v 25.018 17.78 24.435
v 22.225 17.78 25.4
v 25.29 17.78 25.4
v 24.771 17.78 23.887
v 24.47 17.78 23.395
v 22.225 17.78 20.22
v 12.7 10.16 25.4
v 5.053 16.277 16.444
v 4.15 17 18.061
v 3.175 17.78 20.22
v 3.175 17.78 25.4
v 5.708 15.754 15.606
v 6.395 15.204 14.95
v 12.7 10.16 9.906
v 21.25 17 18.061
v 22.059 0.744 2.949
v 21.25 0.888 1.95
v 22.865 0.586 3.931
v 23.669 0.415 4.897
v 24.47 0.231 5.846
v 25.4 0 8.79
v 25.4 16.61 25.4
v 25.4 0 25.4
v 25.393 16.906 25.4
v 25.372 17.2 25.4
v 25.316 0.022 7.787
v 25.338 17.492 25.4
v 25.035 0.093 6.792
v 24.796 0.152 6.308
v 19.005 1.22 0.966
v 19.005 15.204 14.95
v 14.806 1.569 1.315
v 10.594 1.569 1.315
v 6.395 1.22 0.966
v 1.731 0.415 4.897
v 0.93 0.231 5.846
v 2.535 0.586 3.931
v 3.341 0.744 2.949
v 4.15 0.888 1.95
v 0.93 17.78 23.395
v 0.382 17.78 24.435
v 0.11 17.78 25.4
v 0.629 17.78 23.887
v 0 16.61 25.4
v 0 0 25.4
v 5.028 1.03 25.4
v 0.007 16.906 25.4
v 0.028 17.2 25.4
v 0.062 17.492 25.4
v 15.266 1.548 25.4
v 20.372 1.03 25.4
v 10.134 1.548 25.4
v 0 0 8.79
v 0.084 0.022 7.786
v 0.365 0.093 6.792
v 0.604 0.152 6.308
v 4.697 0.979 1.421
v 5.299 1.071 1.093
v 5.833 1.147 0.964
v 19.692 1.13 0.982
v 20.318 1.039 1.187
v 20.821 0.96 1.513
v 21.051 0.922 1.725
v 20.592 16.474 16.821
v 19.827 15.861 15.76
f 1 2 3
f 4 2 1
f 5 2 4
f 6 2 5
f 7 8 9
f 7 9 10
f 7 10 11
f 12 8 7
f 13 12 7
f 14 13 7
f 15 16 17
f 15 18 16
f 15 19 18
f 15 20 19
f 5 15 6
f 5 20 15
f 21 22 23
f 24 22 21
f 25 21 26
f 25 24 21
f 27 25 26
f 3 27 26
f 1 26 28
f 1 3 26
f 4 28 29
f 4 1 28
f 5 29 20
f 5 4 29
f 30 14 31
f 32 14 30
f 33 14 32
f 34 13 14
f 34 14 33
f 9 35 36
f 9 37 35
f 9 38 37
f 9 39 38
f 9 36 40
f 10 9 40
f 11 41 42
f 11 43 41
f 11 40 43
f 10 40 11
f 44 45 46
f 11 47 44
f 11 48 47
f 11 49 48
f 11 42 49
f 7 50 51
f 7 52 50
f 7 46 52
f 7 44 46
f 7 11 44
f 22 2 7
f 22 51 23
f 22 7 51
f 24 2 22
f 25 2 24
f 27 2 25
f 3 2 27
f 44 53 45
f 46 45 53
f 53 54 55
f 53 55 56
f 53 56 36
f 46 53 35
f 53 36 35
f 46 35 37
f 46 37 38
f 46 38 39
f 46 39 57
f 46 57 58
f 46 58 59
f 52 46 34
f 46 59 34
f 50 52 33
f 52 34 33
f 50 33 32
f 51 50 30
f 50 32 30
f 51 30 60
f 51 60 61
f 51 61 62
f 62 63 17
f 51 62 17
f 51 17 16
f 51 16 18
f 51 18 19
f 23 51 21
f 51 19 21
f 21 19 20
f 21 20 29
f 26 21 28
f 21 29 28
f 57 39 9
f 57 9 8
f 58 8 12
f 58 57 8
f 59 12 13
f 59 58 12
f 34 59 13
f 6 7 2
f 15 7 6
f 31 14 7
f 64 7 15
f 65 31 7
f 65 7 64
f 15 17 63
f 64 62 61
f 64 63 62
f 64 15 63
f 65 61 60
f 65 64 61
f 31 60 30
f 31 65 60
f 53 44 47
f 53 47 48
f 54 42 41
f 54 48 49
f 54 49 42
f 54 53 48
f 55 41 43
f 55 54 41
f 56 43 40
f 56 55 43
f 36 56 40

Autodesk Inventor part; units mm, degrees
ref_plane "YZ Plane" through (0, 0, 0) normal (1, 0, 0) x (0, 1, 0)
ref_plane "XZ Plane" through (0, 0, 0) normal (0, 1, 0) x (-1, 0, 0)
ref_plane "XY Plane" through (0, 0, 0) normal (0, 0, 1) x (1, 0, 0)
sketch "Sketch1" plane through (0, 0, 0) normal (0, 0, 1) x (1, 0, 0)
  line L0 (0, 0) -> (0, 17.78)
  line L1 (25.4, 17.78) -> (25.4, 0)
  arc A0 (25.4, 0) -> (0, 0) centre (12.7, -49.1869) ccw
  line L2 (0, 17.78) -> (3.175, 17.78)
  line L3 (3.175, 17.78) -> (12.7, 10.16)
  line L4 (12.7, 10.16) -> (22.225, 17.78)
  line L5 (22.225, 17.78) -> (25.4, 17.78)
  dimension "d4" = 17.78
  dimension "d5" = 25.4
  dimension "d6" = 101.6
  dimension "d7" = 3.175
  dimension "d8" = 7.62
extrude "Extrusion1" add sketch "Sketch1" along normal blind 25.4
chamfer "Chamfer1" distance 17.526 angle 45 2 edges at (23.8125, 17.78, 0) (1.5875, 17.78, 0)
chamfer "Chamfer2" distance 5.08 angle 45 2 edges at (25.4, 9.017, 8.763) (0, 9.017, 8.763)
fillet "Fillet1" radius 3.175 4 edges at (25.4, 8.89, 15.8202) (20.32, 8.6472, 8.3932) (5.08, 8.6472, 8.3932) (0, 8.89, 15.8202)
properties part number "RearMount" material "ABS Plastic"
